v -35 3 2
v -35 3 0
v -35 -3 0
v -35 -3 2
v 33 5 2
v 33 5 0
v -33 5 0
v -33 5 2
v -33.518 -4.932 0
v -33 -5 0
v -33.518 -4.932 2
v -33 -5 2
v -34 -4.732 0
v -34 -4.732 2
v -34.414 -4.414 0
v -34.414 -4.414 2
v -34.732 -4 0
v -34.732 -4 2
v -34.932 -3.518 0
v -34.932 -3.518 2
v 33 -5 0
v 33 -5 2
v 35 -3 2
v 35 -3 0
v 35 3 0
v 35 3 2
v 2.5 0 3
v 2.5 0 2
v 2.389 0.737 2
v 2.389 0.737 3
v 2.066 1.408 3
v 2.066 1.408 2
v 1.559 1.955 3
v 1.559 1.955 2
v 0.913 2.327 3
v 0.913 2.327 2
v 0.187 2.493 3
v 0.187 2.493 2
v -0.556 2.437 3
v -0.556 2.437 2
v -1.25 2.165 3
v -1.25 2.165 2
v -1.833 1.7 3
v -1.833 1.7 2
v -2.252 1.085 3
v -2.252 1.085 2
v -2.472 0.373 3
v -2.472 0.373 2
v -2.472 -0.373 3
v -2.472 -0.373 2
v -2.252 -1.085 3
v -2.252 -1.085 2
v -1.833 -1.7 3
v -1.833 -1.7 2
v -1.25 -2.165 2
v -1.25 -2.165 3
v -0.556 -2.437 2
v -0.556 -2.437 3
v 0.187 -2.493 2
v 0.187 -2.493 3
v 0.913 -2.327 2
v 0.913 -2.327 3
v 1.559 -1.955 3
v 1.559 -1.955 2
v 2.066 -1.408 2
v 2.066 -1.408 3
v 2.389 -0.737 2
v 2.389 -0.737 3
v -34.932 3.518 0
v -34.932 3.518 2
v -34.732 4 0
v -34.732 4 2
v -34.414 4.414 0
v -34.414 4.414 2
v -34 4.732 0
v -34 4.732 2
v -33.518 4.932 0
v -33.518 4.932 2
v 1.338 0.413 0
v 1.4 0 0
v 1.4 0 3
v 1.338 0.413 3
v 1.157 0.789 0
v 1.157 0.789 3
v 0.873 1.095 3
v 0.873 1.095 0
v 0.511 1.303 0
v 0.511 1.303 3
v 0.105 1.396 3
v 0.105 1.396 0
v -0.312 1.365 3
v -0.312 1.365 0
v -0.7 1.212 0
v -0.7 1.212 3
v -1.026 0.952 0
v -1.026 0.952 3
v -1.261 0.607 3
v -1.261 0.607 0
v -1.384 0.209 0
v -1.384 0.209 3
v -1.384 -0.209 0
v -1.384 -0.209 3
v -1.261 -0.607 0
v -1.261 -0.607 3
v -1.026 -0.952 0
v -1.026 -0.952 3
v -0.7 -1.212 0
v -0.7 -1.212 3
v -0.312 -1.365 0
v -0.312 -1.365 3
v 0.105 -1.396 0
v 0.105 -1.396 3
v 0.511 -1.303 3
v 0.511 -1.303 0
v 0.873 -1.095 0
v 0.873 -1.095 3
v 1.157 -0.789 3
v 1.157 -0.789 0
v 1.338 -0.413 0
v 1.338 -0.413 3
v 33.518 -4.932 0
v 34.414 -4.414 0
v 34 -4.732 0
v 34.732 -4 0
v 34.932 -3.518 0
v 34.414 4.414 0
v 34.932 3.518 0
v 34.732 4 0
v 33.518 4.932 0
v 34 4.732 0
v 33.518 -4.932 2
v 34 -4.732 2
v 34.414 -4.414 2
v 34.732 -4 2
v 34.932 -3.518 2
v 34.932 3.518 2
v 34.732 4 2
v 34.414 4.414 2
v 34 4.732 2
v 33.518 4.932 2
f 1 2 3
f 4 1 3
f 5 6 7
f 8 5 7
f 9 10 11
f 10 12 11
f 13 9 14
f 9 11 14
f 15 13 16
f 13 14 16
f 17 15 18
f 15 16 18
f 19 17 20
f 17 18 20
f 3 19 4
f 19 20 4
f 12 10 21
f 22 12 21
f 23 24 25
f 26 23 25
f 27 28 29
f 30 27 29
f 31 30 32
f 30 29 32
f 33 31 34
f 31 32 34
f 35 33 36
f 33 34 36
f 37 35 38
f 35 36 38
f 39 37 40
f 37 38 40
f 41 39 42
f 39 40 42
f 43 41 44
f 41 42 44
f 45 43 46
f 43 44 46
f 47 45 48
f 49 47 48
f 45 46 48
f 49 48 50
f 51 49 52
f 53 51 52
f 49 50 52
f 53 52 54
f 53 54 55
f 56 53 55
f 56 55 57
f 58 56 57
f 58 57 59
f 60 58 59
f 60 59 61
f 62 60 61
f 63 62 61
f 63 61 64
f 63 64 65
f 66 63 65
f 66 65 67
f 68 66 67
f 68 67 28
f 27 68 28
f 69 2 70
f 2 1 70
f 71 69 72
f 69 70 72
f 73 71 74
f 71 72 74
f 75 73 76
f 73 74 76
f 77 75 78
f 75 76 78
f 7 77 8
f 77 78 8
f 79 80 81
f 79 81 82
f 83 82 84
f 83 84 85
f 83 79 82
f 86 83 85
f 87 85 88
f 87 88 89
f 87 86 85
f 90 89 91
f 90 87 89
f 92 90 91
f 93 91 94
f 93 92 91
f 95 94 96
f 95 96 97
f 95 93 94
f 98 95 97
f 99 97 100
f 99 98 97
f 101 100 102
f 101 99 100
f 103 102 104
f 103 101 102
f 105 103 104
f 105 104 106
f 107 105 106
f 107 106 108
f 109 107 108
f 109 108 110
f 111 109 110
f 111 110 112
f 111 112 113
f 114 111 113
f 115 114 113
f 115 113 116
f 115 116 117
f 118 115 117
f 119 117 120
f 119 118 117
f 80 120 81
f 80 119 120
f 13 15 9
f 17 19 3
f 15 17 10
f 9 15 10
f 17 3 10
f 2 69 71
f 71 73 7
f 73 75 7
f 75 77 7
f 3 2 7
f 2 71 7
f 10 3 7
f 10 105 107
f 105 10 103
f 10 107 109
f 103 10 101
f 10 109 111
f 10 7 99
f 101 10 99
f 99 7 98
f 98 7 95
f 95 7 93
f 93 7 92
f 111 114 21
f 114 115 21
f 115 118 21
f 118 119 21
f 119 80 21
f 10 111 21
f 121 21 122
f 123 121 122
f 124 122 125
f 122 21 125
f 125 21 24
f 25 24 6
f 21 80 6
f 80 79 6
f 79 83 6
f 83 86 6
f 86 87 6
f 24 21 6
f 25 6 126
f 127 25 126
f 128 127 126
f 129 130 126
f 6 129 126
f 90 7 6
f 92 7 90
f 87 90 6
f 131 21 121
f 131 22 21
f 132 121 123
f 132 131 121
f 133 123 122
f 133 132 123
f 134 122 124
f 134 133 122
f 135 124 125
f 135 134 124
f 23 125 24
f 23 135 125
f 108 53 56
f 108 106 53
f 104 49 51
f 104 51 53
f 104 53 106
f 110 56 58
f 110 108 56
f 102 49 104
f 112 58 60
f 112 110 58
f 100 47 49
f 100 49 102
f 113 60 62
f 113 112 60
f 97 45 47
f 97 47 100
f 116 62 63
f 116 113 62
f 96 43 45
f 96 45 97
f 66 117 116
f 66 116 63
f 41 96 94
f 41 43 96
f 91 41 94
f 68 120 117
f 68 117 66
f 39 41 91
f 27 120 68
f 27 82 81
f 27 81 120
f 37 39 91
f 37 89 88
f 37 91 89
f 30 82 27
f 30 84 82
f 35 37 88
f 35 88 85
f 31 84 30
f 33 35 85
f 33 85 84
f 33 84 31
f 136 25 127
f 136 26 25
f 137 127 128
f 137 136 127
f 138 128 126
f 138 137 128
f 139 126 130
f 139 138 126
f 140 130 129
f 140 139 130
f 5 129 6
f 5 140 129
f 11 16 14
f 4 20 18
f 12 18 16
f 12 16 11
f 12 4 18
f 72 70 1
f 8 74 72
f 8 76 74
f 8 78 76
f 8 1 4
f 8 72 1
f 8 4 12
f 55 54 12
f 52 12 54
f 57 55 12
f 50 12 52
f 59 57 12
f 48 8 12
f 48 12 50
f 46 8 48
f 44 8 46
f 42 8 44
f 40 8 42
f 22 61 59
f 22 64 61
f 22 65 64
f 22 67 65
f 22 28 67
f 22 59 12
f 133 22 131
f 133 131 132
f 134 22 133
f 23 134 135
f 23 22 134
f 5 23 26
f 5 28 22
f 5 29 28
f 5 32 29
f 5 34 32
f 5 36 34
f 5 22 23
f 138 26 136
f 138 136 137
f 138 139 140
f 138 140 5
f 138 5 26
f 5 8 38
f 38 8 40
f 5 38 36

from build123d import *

# Parameters (mm, degrees)
F0_R     = 2.5
F1_DEPTH = 2
F2_R     = 2
F0_R_2   = 1.4
F3_DEPTH = 3


with BuildPart() as f1:
    # F0 (on Top) → F1 (new body)
    with BuildSketch(Plane.XY):
        Polygon((-35, -5), (35, -5), (35, 5), (0, 5), (-35, 5), (-35, 3.662193), align=None)
        Circle(F0_R, mode=Mode.SUBTRACT)
    extrude(amount=F1_DEPTH)

    # F2
    f2_edges = [f1.edges().sort_by_distance(p)[0] for p in [
        (-35, 5, 1),
        (-35, -5, 1),
        (35, -5, 1),
        (35, 5, 1),
    ]]
    fillet(f2_edges, radius=F2_R)

    # F0 (on Top) → F3 (join)
    with BuildSketch(Plane.XY):
        Circle(F0_R)
        Circle(F0_R_2, mode=Mode.SUBTRACT)
    extrude(amount=F3_DEPTH)


solid = f1.part
